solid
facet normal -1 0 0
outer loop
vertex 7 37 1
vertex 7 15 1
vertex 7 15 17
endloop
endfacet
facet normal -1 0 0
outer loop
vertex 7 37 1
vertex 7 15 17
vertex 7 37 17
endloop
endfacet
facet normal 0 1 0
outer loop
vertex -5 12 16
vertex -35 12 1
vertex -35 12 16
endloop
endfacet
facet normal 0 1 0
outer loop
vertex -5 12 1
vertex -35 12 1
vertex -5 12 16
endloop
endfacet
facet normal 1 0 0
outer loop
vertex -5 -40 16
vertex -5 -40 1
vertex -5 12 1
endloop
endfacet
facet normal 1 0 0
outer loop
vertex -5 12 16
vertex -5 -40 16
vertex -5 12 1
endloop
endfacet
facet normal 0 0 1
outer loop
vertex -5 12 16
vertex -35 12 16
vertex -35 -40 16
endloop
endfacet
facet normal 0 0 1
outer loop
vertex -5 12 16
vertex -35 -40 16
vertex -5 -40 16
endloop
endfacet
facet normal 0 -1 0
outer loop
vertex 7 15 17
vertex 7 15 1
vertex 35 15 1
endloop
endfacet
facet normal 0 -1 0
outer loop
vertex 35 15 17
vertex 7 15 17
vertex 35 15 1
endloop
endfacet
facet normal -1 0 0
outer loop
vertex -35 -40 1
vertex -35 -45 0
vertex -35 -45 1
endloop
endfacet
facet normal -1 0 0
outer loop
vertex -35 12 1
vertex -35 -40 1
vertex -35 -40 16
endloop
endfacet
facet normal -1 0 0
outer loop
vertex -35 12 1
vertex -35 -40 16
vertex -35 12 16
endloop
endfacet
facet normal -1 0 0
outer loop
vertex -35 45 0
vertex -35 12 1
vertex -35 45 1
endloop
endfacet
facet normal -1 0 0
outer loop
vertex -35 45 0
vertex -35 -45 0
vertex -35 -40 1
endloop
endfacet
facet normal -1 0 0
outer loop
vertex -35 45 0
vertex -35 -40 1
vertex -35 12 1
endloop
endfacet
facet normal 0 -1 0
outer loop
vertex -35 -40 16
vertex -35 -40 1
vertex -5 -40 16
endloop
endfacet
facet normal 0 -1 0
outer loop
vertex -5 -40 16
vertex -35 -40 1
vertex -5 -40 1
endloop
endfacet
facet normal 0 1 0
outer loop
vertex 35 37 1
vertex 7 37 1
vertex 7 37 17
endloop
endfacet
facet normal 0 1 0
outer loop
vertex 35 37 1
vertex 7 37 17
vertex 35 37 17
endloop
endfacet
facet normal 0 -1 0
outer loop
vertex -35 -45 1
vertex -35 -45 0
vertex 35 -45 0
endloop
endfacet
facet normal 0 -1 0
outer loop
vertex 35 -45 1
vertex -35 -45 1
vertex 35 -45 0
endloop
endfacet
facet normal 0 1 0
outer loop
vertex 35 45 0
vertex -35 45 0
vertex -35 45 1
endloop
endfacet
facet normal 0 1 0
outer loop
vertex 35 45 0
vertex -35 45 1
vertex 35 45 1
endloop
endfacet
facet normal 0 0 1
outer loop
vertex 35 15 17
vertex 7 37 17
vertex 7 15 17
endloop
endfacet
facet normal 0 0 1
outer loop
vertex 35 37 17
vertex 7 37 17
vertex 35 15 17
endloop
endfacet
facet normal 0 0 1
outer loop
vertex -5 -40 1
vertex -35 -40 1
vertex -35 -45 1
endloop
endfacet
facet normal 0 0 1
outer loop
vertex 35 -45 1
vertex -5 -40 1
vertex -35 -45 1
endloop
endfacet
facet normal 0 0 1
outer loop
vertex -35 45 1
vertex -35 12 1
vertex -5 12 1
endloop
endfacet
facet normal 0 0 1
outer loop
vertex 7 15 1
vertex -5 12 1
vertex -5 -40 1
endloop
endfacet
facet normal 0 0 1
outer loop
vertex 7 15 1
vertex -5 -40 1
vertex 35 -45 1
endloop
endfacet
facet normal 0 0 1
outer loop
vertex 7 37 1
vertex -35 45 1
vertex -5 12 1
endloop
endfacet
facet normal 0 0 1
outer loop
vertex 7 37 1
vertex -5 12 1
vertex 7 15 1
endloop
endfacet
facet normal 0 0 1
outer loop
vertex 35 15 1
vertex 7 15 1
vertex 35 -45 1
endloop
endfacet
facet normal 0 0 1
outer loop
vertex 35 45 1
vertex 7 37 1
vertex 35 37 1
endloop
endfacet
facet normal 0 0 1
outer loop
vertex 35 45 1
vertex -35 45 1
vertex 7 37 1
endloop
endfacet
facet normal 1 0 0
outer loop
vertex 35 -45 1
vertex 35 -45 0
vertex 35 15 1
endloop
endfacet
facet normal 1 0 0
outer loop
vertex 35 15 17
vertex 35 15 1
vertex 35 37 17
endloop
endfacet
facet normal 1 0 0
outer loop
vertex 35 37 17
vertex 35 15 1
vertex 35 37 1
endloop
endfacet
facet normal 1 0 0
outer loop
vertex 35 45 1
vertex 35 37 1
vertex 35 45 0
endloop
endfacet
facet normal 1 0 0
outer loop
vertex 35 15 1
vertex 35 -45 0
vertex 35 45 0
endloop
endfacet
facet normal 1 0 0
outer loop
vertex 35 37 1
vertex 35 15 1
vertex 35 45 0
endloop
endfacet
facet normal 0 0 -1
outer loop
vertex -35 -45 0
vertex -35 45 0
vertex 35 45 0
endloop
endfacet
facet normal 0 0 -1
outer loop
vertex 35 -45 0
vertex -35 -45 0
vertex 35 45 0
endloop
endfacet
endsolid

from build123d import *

# Parameters (mm, degrees)
SKETCH2_W           = 70
SKETCH2_H           = 90
BOSS_EXTRUDE1_DEPTH = 1
SKETCH3_W           = 28
SKETCH3_H           = 22
BOSS_EXTRUDE2_DEPTH = 16
SKETCH4_W           = 30
SKETCH4_H           = 52
BOSS_EXTRUDE3_DEPTH = 15


with BuildPart() as part:
    # Sketch2 → Boss-Extrude1 (new body)
    with BuildSketch(Plane.XY):
        Rectangle(SKETCH2_W, SKETCH2_H)
    extrude(amount=BOSS_EXTRUDE1_DEPTH)

    # Sketch3 → Boss-Extrude2 (add)
    with BuildSketch(Plane.XY.offset(1)):
        with Locations((21, 26)):
            Rectangle(SKETCH3_W, SKETCH3_H)
    extrude(amount=BOSS_EXTRUDE2_DEPTH)

    # Sketch4 → Boss-Extrude3 (add)
    with BuildSketch(Plane.XY.offset(1)):
        with Locations((-20, -14)):
            Rectangle(SKETCH4_W, SKETCH4_H)
    extrude(amount=BOSS_EXTRUDE3_DEPTH)


solid = part.part
